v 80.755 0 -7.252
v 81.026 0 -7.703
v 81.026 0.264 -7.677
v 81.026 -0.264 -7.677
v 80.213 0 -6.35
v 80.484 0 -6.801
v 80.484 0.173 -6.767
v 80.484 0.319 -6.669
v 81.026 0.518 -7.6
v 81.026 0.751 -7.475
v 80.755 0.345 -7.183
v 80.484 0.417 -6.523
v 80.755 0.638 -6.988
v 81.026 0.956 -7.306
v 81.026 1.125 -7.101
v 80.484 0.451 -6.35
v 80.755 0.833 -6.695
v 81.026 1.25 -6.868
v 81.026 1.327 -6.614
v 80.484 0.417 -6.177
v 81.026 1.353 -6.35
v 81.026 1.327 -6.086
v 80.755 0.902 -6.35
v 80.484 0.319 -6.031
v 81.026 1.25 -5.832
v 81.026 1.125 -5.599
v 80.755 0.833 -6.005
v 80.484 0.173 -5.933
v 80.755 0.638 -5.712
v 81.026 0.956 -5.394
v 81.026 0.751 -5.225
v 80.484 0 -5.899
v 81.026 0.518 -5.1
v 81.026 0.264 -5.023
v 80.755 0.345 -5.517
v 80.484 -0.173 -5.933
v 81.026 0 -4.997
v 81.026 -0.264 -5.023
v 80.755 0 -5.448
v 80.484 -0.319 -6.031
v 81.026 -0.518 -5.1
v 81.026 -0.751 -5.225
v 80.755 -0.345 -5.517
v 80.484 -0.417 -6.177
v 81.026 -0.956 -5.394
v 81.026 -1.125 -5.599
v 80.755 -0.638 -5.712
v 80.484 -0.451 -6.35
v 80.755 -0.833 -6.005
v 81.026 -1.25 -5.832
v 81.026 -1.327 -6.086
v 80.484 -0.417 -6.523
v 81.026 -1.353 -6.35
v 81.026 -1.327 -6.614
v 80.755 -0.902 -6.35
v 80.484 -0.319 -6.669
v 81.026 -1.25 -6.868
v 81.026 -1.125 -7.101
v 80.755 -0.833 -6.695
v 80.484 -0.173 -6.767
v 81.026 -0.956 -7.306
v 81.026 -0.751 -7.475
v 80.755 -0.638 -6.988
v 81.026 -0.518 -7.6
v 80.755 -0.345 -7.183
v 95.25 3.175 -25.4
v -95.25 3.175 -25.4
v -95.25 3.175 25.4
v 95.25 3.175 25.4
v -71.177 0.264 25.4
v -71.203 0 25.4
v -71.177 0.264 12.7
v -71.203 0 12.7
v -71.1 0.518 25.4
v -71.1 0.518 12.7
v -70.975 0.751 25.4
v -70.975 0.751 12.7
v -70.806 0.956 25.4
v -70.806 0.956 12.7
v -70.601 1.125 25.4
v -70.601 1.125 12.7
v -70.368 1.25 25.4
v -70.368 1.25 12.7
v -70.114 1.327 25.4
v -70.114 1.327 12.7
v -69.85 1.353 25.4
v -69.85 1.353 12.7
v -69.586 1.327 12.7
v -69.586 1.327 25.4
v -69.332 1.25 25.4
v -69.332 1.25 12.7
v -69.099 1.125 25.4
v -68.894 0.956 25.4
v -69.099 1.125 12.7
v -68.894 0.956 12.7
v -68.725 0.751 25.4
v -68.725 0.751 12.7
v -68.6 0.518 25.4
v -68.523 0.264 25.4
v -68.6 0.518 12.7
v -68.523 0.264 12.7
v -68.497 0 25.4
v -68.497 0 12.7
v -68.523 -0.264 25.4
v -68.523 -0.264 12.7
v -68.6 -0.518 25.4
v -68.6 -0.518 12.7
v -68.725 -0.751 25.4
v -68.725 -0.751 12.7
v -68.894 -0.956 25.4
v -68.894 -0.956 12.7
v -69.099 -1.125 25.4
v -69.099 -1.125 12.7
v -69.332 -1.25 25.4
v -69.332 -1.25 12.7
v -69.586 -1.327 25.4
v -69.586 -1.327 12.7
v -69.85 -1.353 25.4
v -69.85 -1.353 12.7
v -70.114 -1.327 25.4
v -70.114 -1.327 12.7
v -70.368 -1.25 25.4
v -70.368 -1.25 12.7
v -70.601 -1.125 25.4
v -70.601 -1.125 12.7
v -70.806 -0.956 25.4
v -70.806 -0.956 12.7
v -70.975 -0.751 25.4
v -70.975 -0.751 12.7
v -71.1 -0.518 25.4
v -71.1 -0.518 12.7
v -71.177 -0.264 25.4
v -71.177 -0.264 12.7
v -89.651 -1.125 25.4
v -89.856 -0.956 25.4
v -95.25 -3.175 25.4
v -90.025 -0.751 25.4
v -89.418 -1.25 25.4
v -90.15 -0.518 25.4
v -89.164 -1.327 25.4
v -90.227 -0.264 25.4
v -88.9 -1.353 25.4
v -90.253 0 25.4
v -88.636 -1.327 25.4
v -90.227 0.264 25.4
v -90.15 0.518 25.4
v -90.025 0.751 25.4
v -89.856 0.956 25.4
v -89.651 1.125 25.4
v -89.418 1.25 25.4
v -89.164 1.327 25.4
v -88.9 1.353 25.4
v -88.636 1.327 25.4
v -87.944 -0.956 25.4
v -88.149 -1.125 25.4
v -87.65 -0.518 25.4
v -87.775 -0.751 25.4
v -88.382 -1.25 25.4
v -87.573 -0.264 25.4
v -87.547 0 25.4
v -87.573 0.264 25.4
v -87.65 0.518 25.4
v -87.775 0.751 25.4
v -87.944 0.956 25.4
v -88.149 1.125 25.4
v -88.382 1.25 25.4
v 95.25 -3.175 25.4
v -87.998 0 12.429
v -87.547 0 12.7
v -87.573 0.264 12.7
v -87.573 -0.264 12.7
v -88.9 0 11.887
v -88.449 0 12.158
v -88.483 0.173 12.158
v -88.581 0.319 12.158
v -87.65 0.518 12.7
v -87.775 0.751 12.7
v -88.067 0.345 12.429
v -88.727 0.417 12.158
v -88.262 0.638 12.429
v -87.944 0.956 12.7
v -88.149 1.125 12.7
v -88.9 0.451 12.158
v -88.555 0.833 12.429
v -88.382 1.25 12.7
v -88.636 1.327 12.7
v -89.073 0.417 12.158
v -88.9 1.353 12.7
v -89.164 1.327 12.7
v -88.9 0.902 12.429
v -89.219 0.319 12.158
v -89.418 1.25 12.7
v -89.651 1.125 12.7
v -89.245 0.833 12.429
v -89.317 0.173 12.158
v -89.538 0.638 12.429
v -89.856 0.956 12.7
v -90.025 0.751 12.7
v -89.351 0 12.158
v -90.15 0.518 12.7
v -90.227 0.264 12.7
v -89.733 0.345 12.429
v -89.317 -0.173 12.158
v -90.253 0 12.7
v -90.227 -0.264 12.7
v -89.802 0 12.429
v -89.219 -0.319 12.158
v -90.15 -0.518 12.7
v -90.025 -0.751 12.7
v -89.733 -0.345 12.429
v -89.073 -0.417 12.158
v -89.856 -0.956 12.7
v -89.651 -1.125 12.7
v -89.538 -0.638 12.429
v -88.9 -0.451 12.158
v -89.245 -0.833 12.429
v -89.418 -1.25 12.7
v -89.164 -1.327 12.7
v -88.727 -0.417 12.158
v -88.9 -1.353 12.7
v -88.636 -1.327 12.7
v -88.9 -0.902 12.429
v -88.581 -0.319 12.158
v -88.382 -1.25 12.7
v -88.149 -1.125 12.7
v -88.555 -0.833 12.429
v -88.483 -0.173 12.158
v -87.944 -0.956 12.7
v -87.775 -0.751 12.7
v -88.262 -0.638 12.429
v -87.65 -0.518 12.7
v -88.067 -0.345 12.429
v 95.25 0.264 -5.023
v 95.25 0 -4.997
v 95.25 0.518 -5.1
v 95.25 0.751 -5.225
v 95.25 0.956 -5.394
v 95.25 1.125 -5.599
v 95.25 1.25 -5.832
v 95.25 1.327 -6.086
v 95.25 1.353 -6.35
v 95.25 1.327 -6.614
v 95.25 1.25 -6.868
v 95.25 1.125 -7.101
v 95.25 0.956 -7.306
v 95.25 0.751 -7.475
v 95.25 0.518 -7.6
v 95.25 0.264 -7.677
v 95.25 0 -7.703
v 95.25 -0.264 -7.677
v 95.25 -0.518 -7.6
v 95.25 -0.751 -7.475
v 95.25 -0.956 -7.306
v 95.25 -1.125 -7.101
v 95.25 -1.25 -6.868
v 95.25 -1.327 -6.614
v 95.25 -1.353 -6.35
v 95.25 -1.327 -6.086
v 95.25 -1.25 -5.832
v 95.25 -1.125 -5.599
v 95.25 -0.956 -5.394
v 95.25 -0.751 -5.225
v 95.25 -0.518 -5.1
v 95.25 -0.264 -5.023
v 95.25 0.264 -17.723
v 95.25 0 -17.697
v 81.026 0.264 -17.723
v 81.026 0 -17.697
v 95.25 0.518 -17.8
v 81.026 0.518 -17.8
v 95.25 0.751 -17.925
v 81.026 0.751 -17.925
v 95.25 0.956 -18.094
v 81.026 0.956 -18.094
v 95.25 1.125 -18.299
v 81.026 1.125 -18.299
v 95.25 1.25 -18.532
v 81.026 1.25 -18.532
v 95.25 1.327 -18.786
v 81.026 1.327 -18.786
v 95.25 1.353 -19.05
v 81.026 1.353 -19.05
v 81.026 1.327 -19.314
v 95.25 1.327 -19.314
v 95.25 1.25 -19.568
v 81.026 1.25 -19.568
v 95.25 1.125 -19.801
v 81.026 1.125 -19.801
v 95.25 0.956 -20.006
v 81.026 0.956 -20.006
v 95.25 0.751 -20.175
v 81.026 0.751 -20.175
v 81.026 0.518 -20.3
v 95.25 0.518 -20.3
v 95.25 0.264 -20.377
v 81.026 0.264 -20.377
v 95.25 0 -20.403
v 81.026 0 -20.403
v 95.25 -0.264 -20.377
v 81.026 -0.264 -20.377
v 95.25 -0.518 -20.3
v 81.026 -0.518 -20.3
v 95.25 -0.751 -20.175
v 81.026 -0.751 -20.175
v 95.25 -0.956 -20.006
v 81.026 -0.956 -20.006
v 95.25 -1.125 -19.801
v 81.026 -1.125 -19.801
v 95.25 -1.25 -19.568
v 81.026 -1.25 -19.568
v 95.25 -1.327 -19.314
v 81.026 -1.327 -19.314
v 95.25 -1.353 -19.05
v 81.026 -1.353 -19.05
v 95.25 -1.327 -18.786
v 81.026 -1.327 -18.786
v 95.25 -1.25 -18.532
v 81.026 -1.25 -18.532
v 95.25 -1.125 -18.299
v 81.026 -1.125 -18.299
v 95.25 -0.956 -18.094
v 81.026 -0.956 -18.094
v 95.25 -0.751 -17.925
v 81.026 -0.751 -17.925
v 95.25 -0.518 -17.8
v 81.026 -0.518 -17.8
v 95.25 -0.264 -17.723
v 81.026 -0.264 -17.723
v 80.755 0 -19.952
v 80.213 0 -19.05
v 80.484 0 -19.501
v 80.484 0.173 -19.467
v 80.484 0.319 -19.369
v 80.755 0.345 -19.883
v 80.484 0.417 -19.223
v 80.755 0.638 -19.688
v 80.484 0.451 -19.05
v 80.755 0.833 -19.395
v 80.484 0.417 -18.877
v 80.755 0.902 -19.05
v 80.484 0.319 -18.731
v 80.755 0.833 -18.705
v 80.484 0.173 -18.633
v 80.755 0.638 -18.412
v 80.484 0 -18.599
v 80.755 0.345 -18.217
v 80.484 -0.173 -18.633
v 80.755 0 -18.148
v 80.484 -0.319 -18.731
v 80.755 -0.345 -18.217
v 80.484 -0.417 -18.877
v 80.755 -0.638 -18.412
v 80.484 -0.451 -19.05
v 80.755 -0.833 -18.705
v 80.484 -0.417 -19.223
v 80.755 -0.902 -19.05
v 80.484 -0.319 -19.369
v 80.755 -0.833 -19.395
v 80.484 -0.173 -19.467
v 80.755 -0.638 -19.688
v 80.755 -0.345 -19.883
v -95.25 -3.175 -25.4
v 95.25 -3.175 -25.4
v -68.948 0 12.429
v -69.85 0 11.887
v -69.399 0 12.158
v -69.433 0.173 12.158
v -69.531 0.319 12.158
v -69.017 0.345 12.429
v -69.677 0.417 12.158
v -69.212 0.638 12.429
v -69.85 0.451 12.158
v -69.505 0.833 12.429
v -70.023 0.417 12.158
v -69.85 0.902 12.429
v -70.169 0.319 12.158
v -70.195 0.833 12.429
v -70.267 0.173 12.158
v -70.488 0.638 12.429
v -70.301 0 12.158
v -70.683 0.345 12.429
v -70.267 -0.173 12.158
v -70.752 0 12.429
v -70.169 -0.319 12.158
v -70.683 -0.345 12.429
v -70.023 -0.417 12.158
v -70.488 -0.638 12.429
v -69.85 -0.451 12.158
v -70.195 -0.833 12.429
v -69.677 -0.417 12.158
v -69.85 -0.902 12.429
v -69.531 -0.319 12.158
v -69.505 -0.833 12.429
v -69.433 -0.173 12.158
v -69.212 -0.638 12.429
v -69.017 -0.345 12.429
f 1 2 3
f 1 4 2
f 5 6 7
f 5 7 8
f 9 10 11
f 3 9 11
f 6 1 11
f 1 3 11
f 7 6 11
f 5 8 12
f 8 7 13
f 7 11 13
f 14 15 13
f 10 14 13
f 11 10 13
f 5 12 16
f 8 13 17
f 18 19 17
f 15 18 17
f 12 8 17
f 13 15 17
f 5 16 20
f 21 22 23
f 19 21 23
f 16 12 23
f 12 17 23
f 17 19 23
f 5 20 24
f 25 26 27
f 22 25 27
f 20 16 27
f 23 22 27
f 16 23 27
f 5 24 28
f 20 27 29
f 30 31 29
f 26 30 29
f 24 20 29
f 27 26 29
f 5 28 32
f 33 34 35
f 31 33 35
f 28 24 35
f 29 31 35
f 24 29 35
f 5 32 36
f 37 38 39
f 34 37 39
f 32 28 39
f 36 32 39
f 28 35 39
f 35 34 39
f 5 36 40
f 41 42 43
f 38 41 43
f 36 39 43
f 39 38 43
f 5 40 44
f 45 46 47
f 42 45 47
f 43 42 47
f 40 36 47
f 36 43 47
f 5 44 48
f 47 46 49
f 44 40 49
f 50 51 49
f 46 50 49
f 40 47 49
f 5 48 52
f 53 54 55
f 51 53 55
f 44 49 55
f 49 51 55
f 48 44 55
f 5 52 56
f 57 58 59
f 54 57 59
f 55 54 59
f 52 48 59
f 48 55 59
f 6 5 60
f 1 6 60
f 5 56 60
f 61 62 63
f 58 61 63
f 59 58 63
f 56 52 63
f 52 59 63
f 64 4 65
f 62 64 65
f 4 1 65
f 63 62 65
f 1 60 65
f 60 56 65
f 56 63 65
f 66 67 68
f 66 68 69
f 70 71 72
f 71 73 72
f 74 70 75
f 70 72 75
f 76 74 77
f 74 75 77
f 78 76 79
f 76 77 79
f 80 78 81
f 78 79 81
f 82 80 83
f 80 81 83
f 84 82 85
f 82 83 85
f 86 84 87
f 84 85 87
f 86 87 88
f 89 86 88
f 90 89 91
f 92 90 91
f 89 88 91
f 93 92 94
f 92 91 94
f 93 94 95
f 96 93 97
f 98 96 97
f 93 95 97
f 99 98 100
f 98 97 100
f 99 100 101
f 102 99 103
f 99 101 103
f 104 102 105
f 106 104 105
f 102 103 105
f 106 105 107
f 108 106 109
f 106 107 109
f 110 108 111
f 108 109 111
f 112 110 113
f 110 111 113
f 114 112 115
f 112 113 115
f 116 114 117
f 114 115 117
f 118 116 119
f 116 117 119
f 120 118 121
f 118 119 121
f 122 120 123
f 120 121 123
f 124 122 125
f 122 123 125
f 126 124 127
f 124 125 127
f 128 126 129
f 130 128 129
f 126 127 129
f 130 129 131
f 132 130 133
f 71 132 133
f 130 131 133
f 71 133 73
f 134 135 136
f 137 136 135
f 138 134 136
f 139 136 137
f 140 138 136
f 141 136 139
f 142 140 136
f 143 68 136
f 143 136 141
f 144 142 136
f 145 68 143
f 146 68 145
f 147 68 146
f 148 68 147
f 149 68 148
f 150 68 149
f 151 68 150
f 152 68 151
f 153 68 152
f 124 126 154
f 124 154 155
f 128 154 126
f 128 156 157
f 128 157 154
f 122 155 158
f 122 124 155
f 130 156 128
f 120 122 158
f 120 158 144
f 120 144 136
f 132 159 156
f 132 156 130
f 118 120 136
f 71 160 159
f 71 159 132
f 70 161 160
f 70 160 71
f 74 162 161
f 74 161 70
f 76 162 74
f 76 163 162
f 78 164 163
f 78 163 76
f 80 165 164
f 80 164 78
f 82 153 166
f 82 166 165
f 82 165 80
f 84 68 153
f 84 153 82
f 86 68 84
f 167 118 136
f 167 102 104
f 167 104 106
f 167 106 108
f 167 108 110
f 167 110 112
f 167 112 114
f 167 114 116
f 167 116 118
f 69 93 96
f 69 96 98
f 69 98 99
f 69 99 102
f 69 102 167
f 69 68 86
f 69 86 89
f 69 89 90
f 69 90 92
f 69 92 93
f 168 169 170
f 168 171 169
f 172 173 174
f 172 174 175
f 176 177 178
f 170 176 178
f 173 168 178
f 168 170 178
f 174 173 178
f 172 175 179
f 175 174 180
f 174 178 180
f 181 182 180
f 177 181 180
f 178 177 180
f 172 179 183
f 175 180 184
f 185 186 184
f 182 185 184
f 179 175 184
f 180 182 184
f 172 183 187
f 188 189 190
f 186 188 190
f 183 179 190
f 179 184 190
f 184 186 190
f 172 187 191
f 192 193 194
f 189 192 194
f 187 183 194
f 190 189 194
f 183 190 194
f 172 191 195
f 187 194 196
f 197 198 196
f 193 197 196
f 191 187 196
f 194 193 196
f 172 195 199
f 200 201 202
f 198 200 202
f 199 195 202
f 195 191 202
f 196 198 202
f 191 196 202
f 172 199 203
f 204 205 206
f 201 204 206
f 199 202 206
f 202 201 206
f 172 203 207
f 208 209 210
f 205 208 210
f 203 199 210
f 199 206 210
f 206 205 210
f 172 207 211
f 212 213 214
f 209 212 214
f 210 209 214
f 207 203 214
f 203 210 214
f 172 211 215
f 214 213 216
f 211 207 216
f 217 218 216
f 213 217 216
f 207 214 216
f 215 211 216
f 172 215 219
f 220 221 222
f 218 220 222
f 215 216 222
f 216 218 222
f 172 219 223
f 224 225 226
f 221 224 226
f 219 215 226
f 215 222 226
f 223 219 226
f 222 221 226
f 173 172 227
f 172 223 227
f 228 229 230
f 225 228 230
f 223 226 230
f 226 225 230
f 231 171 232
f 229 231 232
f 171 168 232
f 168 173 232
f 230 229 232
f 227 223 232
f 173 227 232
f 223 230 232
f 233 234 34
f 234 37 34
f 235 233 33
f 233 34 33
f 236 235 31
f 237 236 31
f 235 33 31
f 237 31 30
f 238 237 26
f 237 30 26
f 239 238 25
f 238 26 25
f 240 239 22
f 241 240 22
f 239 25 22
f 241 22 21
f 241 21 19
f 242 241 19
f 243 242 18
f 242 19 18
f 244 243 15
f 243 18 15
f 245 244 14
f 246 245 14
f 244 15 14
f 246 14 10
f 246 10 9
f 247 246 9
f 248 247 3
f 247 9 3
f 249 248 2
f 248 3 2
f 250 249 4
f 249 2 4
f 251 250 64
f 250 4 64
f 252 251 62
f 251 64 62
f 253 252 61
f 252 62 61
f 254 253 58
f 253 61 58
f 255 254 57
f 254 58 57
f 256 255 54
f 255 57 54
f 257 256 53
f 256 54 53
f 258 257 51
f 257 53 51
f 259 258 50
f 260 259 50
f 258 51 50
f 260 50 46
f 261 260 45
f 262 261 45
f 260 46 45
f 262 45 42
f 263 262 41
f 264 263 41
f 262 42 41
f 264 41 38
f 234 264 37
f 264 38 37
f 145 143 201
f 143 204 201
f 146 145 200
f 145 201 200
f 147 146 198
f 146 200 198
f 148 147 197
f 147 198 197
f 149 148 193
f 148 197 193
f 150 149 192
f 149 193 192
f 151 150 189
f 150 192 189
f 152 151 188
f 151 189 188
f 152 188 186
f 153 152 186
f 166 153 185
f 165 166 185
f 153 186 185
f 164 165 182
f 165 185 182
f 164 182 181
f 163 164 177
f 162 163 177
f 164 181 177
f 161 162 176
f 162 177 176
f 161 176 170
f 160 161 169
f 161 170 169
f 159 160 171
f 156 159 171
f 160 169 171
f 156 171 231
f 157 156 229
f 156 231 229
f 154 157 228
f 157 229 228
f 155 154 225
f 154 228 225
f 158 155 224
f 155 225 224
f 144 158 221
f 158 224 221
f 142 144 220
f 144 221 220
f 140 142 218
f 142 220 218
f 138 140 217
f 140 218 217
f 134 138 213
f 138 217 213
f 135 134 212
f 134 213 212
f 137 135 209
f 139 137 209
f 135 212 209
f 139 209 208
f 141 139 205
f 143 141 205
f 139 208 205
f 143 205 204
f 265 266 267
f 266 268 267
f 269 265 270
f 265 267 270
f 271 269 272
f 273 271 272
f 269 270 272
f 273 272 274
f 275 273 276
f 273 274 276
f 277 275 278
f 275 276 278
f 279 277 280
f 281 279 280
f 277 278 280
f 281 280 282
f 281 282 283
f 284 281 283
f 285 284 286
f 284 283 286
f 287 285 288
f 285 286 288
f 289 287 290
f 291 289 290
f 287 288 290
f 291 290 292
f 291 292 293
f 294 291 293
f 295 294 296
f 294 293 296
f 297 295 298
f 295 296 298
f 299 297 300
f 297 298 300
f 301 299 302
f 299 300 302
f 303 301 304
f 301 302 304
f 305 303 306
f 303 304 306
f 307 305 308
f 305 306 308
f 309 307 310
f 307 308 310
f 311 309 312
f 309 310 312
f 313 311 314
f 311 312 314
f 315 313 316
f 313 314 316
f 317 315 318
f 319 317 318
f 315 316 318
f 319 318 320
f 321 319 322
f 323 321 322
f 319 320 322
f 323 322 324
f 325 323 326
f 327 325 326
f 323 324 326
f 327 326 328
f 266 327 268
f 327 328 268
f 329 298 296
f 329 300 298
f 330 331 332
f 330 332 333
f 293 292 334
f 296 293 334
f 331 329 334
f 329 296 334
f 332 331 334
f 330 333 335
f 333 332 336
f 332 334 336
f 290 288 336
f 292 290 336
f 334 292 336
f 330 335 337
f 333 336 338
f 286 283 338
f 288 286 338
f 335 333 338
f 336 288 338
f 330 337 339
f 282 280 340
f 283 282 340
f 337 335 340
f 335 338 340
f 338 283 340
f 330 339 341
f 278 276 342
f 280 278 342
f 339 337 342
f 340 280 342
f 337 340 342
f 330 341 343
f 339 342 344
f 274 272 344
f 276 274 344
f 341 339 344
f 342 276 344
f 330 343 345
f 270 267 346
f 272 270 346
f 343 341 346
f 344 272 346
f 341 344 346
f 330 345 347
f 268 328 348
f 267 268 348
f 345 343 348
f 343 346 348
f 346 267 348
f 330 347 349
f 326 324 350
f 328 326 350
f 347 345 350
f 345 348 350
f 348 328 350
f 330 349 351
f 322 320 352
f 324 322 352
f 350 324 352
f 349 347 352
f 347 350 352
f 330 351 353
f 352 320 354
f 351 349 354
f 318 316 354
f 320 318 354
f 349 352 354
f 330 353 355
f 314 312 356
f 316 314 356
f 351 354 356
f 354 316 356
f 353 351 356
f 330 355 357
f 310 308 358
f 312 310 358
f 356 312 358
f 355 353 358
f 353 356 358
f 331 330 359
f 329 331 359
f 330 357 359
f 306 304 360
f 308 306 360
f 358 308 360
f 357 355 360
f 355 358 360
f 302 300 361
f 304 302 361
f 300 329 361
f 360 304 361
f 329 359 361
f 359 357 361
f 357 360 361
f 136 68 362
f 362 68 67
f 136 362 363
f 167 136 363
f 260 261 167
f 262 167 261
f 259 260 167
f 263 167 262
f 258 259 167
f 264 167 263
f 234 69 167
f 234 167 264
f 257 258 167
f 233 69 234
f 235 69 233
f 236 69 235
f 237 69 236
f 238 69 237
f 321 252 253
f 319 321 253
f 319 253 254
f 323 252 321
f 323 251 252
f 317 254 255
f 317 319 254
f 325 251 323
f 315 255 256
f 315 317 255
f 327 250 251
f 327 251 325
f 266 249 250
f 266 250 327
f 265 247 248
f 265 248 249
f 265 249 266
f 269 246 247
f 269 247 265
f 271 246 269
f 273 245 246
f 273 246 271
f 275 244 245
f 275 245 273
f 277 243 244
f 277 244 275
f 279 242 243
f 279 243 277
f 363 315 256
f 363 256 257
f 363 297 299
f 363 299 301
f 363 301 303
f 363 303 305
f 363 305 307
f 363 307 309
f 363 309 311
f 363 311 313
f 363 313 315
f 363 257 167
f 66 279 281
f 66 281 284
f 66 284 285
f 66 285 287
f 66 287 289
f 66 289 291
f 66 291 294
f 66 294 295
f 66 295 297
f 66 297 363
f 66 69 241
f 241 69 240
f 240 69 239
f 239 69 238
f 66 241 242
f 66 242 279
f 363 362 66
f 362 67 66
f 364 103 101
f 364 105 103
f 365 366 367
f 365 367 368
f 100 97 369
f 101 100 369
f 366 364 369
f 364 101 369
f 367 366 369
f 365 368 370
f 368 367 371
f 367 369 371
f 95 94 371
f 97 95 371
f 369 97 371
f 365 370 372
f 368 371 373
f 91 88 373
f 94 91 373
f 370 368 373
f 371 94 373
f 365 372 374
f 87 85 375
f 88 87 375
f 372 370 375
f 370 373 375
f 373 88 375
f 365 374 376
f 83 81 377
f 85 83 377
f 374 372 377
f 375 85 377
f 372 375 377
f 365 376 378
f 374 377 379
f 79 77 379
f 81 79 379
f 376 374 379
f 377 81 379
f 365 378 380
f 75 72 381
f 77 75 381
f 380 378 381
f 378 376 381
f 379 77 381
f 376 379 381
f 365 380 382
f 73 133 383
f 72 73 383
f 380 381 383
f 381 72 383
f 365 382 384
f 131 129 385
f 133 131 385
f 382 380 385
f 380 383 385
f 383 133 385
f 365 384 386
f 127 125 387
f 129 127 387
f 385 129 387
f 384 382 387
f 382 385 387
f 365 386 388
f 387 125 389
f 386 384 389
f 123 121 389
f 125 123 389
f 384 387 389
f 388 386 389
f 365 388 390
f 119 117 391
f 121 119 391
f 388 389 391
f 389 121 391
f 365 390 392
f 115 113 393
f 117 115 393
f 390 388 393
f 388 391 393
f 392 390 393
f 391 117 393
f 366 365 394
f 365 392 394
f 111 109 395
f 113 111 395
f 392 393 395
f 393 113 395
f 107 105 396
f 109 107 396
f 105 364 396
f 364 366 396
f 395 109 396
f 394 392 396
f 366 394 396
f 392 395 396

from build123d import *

# Parameters (mm, degrees)
SKETCH1_W                 = 190.5
SKETCH1_H                 = 50.8
BOSS_EXTRUDE1_DEPTH       = 3.175
F_6_32_TAPPED_HOLE1_D     = 2.7051
F_6_32_TAPPED_HOLE1_DEPTH = 12.7
F_6_32_TAPPED_HOLE1_TIP   = 0.81269403
F_6_32_TAPPED_HOLE2_D     = 2.7051
F_6_32_TAPPED_HOLE2_DEPTH = 14.224
F_6_32_TAPPED_HOLE2_TIP   = 0.81269403


with BuildPart() as part:
    # Sketch1 → Boss-Extrude1 (new, symmetric)
    with BuildSketch(Plane(origin=(0, 0, 0), x_dir=(1, 0, 0), z_dir=(0, 1, 0))):
        Rectangle(SKETCH1_W, SKETCH1_H)
    extrude(amount=BOSS_EXTRUDE1_DEPTH, both=True)

    # #6-32 Tapped Hole1
    with Locations(Plane.XY.offset(25.4)):
        with Locations((-69.85, 0), (-88.9, 0)):
            Hole(F_6_32_TAPPED_HOLE1_D / 2, depth=F_6_32_TAPPED_HOLE1_DEPTH)
            with Locations((0, 0, -(F_6_32_TAPPED_HOLE1_DEPTH + F_6_32_TAPPED_HOLE1_TIP / 2))):  # 118° drill point
                Cone(0, F_6_32_TAPPED_HOLE1_D / 2, F_6_32_TAPPED_HOLE1_TIP, mode=Mode.SUBTRACT)

    # #6-32 Tapped Hole2
    with Locations(Plane(origin=(95.25, 0, 0), x_dir=(0, 0, -1), z_dir=(1, 0, 0))):
        with Locations((6.35, 0), (19.05, 0)):
            Hole(F_6_32_TAPPED_HOLE2_D / 2, depth=F_6_32_TAPPED_HOLE2_DEPTH)
            with Locations((0, 0, -(F_6_32_TAPPED_HOLE2_DEPTH + F_6_32_TAPPED_HOLE2_TIP / 2))):  # 118° drill point
                Cone(0, F_6_32_TAPPED_HOLE2_D / 2, F_6_32_TAPPED_HOLE2_TIP, mode=Mode.SUBTRACT)


solid = part.part
